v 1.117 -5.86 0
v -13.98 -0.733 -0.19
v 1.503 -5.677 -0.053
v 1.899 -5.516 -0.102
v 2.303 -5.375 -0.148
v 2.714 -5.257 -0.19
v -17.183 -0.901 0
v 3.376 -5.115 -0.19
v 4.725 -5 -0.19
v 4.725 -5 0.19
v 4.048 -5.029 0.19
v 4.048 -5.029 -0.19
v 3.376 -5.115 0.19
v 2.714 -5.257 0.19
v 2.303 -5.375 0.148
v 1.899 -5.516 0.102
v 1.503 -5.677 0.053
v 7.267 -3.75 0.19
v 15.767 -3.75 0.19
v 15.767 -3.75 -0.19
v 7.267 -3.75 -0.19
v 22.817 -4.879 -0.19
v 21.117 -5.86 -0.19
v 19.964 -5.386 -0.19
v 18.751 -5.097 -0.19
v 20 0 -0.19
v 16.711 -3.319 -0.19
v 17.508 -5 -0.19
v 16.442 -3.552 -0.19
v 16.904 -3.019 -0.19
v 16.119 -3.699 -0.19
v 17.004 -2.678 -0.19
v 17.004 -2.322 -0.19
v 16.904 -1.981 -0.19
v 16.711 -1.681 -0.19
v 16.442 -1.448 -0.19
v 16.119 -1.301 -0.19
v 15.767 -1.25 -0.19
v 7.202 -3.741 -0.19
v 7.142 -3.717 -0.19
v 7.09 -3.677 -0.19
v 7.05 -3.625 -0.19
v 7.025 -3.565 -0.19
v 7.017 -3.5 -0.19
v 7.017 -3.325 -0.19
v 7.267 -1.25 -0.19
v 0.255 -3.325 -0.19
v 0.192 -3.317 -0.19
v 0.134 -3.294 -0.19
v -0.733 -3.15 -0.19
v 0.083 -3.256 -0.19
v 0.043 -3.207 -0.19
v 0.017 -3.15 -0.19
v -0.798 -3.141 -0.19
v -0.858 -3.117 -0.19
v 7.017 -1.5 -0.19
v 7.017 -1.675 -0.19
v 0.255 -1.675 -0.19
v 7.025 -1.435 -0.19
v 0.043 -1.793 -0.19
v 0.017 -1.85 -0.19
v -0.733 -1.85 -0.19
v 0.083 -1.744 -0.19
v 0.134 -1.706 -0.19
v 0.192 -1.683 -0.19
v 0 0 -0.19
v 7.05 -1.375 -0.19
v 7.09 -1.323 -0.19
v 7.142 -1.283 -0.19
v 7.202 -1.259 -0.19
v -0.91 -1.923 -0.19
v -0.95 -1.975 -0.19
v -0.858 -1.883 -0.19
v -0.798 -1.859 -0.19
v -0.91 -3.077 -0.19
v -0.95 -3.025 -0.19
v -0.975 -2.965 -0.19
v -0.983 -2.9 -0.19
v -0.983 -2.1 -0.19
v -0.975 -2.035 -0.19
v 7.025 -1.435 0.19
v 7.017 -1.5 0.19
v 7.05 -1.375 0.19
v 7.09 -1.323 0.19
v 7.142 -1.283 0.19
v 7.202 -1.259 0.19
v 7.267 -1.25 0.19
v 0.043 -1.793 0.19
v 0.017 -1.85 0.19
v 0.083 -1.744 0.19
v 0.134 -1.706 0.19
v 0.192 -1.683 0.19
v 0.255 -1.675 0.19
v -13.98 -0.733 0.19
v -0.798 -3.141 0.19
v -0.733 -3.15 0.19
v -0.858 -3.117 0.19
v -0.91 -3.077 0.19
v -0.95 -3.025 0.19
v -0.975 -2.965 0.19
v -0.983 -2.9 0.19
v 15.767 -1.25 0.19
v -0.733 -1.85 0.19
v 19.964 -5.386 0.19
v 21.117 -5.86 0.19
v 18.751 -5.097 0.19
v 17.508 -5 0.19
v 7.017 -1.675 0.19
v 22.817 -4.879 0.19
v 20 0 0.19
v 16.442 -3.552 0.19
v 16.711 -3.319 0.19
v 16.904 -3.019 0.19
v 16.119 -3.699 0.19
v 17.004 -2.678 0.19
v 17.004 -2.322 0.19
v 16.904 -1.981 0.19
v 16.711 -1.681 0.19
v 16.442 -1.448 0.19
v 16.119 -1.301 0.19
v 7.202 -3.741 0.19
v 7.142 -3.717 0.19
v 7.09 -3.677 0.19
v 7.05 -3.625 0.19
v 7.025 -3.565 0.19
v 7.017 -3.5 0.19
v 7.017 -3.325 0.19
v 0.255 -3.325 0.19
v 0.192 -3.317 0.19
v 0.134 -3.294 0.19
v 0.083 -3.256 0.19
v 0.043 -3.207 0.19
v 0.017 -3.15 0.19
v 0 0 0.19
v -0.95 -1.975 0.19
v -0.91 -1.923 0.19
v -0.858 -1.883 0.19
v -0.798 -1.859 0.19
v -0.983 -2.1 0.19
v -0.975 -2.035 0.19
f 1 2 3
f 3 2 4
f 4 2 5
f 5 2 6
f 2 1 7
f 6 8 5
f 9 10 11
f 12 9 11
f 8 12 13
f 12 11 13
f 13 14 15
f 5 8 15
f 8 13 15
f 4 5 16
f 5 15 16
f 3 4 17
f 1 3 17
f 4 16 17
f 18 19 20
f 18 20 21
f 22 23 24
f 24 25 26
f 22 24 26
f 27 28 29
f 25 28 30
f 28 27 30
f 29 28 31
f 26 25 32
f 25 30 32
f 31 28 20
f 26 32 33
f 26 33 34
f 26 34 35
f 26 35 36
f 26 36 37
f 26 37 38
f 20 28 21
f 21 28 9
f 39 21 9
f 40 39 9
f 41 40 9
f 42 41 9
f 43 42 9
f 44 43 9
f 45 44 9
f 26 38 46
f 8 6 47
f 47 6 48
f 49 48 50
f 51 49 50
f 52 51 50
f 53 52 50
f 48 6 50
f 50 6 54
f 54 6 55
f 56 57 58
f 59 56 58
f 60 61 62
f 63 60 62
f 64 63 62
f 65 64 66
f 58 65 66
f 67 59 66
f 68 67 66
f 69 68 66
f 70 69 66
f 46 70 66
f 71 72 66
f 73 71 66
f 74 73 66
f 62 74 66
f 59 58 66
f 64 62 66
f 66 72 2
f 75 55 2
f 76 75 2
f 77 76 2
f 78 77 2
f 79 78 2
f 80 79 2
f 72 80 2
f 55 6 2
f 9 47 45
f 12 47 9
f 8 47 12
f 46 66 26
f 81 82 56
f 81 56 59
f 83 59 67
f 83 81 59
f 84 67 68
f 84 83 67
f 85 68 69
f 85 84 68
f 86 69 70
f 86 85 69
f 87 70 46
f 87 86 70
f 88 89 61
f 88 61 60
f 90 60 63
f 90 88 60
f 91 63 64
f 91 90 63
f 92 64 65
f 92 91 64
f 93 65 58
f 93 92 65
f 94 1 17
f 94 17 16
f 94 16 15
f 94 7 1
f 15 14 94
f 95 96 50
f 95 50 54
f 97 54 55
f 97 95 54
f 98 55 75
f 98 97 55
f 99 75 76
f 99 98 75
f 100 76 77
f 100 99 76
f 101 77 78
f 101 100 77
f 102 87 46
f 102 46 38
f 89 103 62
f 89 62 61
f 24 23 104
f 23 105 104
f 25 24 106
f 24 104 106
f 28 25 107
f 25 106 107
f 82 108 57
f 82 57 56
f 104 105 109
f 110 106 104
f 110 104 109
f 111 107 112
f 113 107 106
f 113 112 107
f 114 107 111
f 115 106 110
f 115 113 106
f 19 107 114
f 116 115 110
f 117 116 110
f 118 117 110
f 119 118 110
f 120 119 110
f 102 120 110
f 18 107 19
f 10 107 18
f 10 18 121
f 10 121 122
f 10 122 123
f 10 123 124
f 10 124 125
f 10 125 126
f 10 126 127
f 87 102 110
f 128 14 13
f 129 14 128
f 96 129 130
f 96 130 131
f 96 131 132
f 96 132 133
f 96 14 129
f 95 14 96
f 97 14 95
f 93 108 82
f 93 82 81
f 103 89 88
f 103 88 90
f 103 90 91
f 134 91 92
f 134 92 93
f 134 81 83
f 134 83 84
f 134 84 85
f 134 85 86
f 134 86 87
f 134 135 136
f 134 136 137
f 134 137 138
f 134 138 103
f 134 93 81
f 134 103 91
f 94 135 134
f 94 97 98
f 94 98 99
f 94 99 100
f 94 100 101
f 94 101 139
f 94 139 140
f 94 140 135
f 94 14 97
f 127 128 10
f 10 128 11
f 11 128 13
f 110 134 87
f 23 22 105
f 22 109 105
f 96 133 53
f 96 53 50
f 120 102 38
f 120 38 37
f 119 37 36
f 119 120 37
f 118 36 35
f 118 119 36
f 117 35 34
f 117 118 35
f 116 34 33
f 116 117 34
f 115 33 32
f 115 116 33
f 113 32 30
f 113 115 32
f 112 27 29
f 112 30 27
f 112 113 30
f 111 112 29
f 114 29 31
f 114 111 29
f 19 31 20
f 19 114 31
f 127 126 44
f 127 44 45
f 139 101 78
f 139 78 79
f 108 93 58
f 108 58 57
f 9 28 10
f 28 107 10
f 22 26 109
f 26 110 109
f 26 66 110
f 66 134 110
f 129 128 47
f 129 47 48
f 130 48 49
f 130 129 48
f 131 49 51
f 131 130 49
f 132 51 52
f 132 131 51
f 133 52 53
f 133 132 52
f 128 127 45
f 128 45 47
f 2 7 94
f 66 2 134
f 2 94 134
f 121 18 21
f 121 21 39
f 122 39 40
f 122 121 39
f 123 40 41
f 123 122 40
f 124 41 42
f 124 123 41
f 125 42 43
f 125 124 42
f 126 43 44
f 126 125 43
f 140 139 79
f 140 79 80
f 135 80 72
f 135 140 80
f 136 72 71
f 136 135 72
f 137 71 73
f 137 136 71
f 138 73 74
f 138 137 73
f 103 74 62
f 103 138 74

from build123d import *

# Parameters (mm, degrees)
BOSS_EXTRU_1_DEPTH           = 0.19
ENL_V_MAT_EXTRU_1_DEPTH      = 24.560167769
CONG_1_R                     = 0.25
ENL_V_MAT_EXTRU_2_DEPTH      = 21.94767488
ENL_V_MAT_EXTRU_2_DEPTH_BACK = 21.94767488


with BuildPart() as part:
    # Esquisse1 → Boss.-Extru.1 (new, symmetric)
    with BuildSketch(Plane.XY):
        with BuildLine():
            Line((-17.183394089, -0.900543525), (0, 0))
            Line((0, 0), (20, 0))
            Line((20, 0), (22.816605911, -4.878504542))
            Line((22.816605911, -4.878504542), (21.116605911, -5.86))
            ThreePointArc((21.116605911, -5.86), (19.362950472, -5.217969417), (17.508226773, -5))
            Line((17.508226773, -5), (4.724985048, -5))
            ThreePointArc((4.724985048, -5), (2.870261349, -5.217969417), (1.116605911, -5.86))
            Line((1.116605911, -5.86), (-17.183394089, -0.900543525))
        make_face()
    extrude(amount=BOSS_EXTRU_1_DEPTH, both=True)

    # Esquisse2 → Enlèv. mat.-Extru.1 (cut, through all)
    with BuildSketch(Plane.XY.offset(0.19)):
        with BuildLine():
            Line((-0.983394089, -1.85), (0.016605911, -1.85))
            Line((0.016605911, -1.85), (0.016605911, -1.675))
            Line((0.016605911, -1.675), (7.016605911, -1.675))
            Line((7.016605911, -1.675), (7.016605911, -1.25))
            Line((7.016605911, -1.25), (15.766605911, -1.25))
            ThreePointArc((15.766605911, -1.25), (17.016605911, -2.5), (15.766605911, -3.75))
            Line((15.766605911, -3.75), (7.016605911, -3.75))
            Line((7.016605911, -3.75), (7.016605911, -3.325))
            Line((7.016605911, -3.325), (0.016605911, -3.325))
            Line((0.016605911, -3.325), (0.016605911, -3.15))
            Line((0.016605911, -3.15), (-0.983394089, -3.15))
            Line((-0.983394089, -3.15), (-0.983394089, -1.85))
        make_face()
    extrude(amount=-ENL_V_MAT_EXTRU_1_DEPTH, mode=Mode.SUBTRACT)

    # Congé1
    # the kernel refuses this fillet: 0.25 mm, written as the material it adds along each edge
    with BuildSketch(Plane(origin=(7.016605911, -3.75, 0.19), x_dir=(0, 1, 0), z_dir=(0, 0, -1))) as cong_1_piece_1:
        with BuildLine():
            CenterArc((CONG_1_R, CONG_1_R), CONG_1_R, 180, 90)
            Line((0, CONG_1_R), (-CONG_1_R * 0.02, CONG_1_R))
            Line((-CONG_1_R * 0.02, CONG_1_R), (-CONG_1_R * 0.02, -CONG_1_R * 0.02))
            Line((-CONG_1_R * 0.02, -CONG_1_R * 0.02), (CONG_1_R, -CONG_1_R * 0.02))
            Line((CONG_1_R, -CONG_1_R * 0.02), (CONG_1_R, 0))
        make_face()
    extrude(amount=0.38)
    with BuildSketch(Plane(origin=(7.016605911, -1.25, 0.19), x_dir=(0, -1, 0), z_dir=(0, 0, -1)), Plane(origin=(-0.983394089, -3.15, 0.19), x_dir=(1, 0, 0), z_dir=(0, 0, -1)), Plane(origin=(-0.983394089, -1.85, 0.19), x_dir=(0, -1, 0), z_dir=(0, 0, -1))) as cong_1_piece_2:
        with BuildLine():
            CenterArc((CONG_1_R, -CONG_1_R), CONG_1_R, 90, 90)
            Line((0, -CONG_1_R), (-CONG_1_R * 0.02, -CONG_1_R))
            Line((-CONG_1_R * 0.02, -CONG_1_R), (-CONG_1_R * 0.02, CONG_1_R * 0.02))
            Line((-CONG_1_R * 0.02, CONG_1_R * 0.02), (CONG_1_R, CONG_1_R * 0.02))
            Line((CONG_1_R, CONG_1_R * 0.02), (CONG_1_R, 0))
        make_face()
    extrude(amount=0.38)
    with BuildSketch(Plane(origin=(0.016605911, -3.325, 0.19), x_dir=(1, 0, 0), z_dir=(0, 0, -1))) as cong_1_piece_3:
        with BuildLine():
            CenterArc((0.2384848, -0.25), CONG_1_R, 90, 72.542396876)
            Line((0, -0.175), (-0.004769696, -0.1735))
            ThreePointArc((-0.004769696, -0.1735), (-0.005, -0.0875), (-0.005, 0))
            Line((-0.005, 0), (0, 0.005))
            Line((0, 0.005), (0.2384848, 0.005))
            Line((0.2384848, 0.005), (0.2384848, 0))
        make_face()
    extrude(amount=0.38)
    with BuildSketch(Plane(origin=(0.016605911, -1.675, 0.19), x_dir=(0, -1, 0), z_dir=(0, 0, -1))) as cong_1_piece_4:
        with BuildLine():
            CenterArc((0.25, -0.2384848), CONG_1_R, 107.457603124, 72.542396876)
            Line((0, -0.2384848), (-0.005, -0.2384848))
            Line((-0.005, -0.2384848), (-0.005, 0))
            Line((-0.005, 0), (0, 0.005))
            ThreePointArc((0, 0.005), (0.0875, 0.005), (0.1735, 0.004769696))
            Line((0.1735, 0.004769696), (0.175, 0))
        make_face()
    extrude(amount=0.38)

    # Esquisse3 → Enlèv. mat.-Extru.2 (cut, two sides: drawn at the far end of the back side and taken through both)
    with BuildSketch(Plane(origin=(2.519658127, -0.682848897, 0), x_dir=(0, 0, 1), z_dir=(-0.9651836866427717, 0.26157303194073345, 0)).offset(-ENL_V_MAT_EXTRU_2_DEPTH_BACK)):
        Polygon((0, -5.36390241), (0.19, -4.36390241), (0.19, -5.53890241), (-0.19, -5.53890241), (-0.19, -4.36390241), align=None)
    extrude(amount=ENL_V_MAT_EXTRU_2_DEPTH + ENL_V_MAT_EXTRU_2_DEPTH_BACK, mode=Mode.SUBTRACT)


solid = part.part
